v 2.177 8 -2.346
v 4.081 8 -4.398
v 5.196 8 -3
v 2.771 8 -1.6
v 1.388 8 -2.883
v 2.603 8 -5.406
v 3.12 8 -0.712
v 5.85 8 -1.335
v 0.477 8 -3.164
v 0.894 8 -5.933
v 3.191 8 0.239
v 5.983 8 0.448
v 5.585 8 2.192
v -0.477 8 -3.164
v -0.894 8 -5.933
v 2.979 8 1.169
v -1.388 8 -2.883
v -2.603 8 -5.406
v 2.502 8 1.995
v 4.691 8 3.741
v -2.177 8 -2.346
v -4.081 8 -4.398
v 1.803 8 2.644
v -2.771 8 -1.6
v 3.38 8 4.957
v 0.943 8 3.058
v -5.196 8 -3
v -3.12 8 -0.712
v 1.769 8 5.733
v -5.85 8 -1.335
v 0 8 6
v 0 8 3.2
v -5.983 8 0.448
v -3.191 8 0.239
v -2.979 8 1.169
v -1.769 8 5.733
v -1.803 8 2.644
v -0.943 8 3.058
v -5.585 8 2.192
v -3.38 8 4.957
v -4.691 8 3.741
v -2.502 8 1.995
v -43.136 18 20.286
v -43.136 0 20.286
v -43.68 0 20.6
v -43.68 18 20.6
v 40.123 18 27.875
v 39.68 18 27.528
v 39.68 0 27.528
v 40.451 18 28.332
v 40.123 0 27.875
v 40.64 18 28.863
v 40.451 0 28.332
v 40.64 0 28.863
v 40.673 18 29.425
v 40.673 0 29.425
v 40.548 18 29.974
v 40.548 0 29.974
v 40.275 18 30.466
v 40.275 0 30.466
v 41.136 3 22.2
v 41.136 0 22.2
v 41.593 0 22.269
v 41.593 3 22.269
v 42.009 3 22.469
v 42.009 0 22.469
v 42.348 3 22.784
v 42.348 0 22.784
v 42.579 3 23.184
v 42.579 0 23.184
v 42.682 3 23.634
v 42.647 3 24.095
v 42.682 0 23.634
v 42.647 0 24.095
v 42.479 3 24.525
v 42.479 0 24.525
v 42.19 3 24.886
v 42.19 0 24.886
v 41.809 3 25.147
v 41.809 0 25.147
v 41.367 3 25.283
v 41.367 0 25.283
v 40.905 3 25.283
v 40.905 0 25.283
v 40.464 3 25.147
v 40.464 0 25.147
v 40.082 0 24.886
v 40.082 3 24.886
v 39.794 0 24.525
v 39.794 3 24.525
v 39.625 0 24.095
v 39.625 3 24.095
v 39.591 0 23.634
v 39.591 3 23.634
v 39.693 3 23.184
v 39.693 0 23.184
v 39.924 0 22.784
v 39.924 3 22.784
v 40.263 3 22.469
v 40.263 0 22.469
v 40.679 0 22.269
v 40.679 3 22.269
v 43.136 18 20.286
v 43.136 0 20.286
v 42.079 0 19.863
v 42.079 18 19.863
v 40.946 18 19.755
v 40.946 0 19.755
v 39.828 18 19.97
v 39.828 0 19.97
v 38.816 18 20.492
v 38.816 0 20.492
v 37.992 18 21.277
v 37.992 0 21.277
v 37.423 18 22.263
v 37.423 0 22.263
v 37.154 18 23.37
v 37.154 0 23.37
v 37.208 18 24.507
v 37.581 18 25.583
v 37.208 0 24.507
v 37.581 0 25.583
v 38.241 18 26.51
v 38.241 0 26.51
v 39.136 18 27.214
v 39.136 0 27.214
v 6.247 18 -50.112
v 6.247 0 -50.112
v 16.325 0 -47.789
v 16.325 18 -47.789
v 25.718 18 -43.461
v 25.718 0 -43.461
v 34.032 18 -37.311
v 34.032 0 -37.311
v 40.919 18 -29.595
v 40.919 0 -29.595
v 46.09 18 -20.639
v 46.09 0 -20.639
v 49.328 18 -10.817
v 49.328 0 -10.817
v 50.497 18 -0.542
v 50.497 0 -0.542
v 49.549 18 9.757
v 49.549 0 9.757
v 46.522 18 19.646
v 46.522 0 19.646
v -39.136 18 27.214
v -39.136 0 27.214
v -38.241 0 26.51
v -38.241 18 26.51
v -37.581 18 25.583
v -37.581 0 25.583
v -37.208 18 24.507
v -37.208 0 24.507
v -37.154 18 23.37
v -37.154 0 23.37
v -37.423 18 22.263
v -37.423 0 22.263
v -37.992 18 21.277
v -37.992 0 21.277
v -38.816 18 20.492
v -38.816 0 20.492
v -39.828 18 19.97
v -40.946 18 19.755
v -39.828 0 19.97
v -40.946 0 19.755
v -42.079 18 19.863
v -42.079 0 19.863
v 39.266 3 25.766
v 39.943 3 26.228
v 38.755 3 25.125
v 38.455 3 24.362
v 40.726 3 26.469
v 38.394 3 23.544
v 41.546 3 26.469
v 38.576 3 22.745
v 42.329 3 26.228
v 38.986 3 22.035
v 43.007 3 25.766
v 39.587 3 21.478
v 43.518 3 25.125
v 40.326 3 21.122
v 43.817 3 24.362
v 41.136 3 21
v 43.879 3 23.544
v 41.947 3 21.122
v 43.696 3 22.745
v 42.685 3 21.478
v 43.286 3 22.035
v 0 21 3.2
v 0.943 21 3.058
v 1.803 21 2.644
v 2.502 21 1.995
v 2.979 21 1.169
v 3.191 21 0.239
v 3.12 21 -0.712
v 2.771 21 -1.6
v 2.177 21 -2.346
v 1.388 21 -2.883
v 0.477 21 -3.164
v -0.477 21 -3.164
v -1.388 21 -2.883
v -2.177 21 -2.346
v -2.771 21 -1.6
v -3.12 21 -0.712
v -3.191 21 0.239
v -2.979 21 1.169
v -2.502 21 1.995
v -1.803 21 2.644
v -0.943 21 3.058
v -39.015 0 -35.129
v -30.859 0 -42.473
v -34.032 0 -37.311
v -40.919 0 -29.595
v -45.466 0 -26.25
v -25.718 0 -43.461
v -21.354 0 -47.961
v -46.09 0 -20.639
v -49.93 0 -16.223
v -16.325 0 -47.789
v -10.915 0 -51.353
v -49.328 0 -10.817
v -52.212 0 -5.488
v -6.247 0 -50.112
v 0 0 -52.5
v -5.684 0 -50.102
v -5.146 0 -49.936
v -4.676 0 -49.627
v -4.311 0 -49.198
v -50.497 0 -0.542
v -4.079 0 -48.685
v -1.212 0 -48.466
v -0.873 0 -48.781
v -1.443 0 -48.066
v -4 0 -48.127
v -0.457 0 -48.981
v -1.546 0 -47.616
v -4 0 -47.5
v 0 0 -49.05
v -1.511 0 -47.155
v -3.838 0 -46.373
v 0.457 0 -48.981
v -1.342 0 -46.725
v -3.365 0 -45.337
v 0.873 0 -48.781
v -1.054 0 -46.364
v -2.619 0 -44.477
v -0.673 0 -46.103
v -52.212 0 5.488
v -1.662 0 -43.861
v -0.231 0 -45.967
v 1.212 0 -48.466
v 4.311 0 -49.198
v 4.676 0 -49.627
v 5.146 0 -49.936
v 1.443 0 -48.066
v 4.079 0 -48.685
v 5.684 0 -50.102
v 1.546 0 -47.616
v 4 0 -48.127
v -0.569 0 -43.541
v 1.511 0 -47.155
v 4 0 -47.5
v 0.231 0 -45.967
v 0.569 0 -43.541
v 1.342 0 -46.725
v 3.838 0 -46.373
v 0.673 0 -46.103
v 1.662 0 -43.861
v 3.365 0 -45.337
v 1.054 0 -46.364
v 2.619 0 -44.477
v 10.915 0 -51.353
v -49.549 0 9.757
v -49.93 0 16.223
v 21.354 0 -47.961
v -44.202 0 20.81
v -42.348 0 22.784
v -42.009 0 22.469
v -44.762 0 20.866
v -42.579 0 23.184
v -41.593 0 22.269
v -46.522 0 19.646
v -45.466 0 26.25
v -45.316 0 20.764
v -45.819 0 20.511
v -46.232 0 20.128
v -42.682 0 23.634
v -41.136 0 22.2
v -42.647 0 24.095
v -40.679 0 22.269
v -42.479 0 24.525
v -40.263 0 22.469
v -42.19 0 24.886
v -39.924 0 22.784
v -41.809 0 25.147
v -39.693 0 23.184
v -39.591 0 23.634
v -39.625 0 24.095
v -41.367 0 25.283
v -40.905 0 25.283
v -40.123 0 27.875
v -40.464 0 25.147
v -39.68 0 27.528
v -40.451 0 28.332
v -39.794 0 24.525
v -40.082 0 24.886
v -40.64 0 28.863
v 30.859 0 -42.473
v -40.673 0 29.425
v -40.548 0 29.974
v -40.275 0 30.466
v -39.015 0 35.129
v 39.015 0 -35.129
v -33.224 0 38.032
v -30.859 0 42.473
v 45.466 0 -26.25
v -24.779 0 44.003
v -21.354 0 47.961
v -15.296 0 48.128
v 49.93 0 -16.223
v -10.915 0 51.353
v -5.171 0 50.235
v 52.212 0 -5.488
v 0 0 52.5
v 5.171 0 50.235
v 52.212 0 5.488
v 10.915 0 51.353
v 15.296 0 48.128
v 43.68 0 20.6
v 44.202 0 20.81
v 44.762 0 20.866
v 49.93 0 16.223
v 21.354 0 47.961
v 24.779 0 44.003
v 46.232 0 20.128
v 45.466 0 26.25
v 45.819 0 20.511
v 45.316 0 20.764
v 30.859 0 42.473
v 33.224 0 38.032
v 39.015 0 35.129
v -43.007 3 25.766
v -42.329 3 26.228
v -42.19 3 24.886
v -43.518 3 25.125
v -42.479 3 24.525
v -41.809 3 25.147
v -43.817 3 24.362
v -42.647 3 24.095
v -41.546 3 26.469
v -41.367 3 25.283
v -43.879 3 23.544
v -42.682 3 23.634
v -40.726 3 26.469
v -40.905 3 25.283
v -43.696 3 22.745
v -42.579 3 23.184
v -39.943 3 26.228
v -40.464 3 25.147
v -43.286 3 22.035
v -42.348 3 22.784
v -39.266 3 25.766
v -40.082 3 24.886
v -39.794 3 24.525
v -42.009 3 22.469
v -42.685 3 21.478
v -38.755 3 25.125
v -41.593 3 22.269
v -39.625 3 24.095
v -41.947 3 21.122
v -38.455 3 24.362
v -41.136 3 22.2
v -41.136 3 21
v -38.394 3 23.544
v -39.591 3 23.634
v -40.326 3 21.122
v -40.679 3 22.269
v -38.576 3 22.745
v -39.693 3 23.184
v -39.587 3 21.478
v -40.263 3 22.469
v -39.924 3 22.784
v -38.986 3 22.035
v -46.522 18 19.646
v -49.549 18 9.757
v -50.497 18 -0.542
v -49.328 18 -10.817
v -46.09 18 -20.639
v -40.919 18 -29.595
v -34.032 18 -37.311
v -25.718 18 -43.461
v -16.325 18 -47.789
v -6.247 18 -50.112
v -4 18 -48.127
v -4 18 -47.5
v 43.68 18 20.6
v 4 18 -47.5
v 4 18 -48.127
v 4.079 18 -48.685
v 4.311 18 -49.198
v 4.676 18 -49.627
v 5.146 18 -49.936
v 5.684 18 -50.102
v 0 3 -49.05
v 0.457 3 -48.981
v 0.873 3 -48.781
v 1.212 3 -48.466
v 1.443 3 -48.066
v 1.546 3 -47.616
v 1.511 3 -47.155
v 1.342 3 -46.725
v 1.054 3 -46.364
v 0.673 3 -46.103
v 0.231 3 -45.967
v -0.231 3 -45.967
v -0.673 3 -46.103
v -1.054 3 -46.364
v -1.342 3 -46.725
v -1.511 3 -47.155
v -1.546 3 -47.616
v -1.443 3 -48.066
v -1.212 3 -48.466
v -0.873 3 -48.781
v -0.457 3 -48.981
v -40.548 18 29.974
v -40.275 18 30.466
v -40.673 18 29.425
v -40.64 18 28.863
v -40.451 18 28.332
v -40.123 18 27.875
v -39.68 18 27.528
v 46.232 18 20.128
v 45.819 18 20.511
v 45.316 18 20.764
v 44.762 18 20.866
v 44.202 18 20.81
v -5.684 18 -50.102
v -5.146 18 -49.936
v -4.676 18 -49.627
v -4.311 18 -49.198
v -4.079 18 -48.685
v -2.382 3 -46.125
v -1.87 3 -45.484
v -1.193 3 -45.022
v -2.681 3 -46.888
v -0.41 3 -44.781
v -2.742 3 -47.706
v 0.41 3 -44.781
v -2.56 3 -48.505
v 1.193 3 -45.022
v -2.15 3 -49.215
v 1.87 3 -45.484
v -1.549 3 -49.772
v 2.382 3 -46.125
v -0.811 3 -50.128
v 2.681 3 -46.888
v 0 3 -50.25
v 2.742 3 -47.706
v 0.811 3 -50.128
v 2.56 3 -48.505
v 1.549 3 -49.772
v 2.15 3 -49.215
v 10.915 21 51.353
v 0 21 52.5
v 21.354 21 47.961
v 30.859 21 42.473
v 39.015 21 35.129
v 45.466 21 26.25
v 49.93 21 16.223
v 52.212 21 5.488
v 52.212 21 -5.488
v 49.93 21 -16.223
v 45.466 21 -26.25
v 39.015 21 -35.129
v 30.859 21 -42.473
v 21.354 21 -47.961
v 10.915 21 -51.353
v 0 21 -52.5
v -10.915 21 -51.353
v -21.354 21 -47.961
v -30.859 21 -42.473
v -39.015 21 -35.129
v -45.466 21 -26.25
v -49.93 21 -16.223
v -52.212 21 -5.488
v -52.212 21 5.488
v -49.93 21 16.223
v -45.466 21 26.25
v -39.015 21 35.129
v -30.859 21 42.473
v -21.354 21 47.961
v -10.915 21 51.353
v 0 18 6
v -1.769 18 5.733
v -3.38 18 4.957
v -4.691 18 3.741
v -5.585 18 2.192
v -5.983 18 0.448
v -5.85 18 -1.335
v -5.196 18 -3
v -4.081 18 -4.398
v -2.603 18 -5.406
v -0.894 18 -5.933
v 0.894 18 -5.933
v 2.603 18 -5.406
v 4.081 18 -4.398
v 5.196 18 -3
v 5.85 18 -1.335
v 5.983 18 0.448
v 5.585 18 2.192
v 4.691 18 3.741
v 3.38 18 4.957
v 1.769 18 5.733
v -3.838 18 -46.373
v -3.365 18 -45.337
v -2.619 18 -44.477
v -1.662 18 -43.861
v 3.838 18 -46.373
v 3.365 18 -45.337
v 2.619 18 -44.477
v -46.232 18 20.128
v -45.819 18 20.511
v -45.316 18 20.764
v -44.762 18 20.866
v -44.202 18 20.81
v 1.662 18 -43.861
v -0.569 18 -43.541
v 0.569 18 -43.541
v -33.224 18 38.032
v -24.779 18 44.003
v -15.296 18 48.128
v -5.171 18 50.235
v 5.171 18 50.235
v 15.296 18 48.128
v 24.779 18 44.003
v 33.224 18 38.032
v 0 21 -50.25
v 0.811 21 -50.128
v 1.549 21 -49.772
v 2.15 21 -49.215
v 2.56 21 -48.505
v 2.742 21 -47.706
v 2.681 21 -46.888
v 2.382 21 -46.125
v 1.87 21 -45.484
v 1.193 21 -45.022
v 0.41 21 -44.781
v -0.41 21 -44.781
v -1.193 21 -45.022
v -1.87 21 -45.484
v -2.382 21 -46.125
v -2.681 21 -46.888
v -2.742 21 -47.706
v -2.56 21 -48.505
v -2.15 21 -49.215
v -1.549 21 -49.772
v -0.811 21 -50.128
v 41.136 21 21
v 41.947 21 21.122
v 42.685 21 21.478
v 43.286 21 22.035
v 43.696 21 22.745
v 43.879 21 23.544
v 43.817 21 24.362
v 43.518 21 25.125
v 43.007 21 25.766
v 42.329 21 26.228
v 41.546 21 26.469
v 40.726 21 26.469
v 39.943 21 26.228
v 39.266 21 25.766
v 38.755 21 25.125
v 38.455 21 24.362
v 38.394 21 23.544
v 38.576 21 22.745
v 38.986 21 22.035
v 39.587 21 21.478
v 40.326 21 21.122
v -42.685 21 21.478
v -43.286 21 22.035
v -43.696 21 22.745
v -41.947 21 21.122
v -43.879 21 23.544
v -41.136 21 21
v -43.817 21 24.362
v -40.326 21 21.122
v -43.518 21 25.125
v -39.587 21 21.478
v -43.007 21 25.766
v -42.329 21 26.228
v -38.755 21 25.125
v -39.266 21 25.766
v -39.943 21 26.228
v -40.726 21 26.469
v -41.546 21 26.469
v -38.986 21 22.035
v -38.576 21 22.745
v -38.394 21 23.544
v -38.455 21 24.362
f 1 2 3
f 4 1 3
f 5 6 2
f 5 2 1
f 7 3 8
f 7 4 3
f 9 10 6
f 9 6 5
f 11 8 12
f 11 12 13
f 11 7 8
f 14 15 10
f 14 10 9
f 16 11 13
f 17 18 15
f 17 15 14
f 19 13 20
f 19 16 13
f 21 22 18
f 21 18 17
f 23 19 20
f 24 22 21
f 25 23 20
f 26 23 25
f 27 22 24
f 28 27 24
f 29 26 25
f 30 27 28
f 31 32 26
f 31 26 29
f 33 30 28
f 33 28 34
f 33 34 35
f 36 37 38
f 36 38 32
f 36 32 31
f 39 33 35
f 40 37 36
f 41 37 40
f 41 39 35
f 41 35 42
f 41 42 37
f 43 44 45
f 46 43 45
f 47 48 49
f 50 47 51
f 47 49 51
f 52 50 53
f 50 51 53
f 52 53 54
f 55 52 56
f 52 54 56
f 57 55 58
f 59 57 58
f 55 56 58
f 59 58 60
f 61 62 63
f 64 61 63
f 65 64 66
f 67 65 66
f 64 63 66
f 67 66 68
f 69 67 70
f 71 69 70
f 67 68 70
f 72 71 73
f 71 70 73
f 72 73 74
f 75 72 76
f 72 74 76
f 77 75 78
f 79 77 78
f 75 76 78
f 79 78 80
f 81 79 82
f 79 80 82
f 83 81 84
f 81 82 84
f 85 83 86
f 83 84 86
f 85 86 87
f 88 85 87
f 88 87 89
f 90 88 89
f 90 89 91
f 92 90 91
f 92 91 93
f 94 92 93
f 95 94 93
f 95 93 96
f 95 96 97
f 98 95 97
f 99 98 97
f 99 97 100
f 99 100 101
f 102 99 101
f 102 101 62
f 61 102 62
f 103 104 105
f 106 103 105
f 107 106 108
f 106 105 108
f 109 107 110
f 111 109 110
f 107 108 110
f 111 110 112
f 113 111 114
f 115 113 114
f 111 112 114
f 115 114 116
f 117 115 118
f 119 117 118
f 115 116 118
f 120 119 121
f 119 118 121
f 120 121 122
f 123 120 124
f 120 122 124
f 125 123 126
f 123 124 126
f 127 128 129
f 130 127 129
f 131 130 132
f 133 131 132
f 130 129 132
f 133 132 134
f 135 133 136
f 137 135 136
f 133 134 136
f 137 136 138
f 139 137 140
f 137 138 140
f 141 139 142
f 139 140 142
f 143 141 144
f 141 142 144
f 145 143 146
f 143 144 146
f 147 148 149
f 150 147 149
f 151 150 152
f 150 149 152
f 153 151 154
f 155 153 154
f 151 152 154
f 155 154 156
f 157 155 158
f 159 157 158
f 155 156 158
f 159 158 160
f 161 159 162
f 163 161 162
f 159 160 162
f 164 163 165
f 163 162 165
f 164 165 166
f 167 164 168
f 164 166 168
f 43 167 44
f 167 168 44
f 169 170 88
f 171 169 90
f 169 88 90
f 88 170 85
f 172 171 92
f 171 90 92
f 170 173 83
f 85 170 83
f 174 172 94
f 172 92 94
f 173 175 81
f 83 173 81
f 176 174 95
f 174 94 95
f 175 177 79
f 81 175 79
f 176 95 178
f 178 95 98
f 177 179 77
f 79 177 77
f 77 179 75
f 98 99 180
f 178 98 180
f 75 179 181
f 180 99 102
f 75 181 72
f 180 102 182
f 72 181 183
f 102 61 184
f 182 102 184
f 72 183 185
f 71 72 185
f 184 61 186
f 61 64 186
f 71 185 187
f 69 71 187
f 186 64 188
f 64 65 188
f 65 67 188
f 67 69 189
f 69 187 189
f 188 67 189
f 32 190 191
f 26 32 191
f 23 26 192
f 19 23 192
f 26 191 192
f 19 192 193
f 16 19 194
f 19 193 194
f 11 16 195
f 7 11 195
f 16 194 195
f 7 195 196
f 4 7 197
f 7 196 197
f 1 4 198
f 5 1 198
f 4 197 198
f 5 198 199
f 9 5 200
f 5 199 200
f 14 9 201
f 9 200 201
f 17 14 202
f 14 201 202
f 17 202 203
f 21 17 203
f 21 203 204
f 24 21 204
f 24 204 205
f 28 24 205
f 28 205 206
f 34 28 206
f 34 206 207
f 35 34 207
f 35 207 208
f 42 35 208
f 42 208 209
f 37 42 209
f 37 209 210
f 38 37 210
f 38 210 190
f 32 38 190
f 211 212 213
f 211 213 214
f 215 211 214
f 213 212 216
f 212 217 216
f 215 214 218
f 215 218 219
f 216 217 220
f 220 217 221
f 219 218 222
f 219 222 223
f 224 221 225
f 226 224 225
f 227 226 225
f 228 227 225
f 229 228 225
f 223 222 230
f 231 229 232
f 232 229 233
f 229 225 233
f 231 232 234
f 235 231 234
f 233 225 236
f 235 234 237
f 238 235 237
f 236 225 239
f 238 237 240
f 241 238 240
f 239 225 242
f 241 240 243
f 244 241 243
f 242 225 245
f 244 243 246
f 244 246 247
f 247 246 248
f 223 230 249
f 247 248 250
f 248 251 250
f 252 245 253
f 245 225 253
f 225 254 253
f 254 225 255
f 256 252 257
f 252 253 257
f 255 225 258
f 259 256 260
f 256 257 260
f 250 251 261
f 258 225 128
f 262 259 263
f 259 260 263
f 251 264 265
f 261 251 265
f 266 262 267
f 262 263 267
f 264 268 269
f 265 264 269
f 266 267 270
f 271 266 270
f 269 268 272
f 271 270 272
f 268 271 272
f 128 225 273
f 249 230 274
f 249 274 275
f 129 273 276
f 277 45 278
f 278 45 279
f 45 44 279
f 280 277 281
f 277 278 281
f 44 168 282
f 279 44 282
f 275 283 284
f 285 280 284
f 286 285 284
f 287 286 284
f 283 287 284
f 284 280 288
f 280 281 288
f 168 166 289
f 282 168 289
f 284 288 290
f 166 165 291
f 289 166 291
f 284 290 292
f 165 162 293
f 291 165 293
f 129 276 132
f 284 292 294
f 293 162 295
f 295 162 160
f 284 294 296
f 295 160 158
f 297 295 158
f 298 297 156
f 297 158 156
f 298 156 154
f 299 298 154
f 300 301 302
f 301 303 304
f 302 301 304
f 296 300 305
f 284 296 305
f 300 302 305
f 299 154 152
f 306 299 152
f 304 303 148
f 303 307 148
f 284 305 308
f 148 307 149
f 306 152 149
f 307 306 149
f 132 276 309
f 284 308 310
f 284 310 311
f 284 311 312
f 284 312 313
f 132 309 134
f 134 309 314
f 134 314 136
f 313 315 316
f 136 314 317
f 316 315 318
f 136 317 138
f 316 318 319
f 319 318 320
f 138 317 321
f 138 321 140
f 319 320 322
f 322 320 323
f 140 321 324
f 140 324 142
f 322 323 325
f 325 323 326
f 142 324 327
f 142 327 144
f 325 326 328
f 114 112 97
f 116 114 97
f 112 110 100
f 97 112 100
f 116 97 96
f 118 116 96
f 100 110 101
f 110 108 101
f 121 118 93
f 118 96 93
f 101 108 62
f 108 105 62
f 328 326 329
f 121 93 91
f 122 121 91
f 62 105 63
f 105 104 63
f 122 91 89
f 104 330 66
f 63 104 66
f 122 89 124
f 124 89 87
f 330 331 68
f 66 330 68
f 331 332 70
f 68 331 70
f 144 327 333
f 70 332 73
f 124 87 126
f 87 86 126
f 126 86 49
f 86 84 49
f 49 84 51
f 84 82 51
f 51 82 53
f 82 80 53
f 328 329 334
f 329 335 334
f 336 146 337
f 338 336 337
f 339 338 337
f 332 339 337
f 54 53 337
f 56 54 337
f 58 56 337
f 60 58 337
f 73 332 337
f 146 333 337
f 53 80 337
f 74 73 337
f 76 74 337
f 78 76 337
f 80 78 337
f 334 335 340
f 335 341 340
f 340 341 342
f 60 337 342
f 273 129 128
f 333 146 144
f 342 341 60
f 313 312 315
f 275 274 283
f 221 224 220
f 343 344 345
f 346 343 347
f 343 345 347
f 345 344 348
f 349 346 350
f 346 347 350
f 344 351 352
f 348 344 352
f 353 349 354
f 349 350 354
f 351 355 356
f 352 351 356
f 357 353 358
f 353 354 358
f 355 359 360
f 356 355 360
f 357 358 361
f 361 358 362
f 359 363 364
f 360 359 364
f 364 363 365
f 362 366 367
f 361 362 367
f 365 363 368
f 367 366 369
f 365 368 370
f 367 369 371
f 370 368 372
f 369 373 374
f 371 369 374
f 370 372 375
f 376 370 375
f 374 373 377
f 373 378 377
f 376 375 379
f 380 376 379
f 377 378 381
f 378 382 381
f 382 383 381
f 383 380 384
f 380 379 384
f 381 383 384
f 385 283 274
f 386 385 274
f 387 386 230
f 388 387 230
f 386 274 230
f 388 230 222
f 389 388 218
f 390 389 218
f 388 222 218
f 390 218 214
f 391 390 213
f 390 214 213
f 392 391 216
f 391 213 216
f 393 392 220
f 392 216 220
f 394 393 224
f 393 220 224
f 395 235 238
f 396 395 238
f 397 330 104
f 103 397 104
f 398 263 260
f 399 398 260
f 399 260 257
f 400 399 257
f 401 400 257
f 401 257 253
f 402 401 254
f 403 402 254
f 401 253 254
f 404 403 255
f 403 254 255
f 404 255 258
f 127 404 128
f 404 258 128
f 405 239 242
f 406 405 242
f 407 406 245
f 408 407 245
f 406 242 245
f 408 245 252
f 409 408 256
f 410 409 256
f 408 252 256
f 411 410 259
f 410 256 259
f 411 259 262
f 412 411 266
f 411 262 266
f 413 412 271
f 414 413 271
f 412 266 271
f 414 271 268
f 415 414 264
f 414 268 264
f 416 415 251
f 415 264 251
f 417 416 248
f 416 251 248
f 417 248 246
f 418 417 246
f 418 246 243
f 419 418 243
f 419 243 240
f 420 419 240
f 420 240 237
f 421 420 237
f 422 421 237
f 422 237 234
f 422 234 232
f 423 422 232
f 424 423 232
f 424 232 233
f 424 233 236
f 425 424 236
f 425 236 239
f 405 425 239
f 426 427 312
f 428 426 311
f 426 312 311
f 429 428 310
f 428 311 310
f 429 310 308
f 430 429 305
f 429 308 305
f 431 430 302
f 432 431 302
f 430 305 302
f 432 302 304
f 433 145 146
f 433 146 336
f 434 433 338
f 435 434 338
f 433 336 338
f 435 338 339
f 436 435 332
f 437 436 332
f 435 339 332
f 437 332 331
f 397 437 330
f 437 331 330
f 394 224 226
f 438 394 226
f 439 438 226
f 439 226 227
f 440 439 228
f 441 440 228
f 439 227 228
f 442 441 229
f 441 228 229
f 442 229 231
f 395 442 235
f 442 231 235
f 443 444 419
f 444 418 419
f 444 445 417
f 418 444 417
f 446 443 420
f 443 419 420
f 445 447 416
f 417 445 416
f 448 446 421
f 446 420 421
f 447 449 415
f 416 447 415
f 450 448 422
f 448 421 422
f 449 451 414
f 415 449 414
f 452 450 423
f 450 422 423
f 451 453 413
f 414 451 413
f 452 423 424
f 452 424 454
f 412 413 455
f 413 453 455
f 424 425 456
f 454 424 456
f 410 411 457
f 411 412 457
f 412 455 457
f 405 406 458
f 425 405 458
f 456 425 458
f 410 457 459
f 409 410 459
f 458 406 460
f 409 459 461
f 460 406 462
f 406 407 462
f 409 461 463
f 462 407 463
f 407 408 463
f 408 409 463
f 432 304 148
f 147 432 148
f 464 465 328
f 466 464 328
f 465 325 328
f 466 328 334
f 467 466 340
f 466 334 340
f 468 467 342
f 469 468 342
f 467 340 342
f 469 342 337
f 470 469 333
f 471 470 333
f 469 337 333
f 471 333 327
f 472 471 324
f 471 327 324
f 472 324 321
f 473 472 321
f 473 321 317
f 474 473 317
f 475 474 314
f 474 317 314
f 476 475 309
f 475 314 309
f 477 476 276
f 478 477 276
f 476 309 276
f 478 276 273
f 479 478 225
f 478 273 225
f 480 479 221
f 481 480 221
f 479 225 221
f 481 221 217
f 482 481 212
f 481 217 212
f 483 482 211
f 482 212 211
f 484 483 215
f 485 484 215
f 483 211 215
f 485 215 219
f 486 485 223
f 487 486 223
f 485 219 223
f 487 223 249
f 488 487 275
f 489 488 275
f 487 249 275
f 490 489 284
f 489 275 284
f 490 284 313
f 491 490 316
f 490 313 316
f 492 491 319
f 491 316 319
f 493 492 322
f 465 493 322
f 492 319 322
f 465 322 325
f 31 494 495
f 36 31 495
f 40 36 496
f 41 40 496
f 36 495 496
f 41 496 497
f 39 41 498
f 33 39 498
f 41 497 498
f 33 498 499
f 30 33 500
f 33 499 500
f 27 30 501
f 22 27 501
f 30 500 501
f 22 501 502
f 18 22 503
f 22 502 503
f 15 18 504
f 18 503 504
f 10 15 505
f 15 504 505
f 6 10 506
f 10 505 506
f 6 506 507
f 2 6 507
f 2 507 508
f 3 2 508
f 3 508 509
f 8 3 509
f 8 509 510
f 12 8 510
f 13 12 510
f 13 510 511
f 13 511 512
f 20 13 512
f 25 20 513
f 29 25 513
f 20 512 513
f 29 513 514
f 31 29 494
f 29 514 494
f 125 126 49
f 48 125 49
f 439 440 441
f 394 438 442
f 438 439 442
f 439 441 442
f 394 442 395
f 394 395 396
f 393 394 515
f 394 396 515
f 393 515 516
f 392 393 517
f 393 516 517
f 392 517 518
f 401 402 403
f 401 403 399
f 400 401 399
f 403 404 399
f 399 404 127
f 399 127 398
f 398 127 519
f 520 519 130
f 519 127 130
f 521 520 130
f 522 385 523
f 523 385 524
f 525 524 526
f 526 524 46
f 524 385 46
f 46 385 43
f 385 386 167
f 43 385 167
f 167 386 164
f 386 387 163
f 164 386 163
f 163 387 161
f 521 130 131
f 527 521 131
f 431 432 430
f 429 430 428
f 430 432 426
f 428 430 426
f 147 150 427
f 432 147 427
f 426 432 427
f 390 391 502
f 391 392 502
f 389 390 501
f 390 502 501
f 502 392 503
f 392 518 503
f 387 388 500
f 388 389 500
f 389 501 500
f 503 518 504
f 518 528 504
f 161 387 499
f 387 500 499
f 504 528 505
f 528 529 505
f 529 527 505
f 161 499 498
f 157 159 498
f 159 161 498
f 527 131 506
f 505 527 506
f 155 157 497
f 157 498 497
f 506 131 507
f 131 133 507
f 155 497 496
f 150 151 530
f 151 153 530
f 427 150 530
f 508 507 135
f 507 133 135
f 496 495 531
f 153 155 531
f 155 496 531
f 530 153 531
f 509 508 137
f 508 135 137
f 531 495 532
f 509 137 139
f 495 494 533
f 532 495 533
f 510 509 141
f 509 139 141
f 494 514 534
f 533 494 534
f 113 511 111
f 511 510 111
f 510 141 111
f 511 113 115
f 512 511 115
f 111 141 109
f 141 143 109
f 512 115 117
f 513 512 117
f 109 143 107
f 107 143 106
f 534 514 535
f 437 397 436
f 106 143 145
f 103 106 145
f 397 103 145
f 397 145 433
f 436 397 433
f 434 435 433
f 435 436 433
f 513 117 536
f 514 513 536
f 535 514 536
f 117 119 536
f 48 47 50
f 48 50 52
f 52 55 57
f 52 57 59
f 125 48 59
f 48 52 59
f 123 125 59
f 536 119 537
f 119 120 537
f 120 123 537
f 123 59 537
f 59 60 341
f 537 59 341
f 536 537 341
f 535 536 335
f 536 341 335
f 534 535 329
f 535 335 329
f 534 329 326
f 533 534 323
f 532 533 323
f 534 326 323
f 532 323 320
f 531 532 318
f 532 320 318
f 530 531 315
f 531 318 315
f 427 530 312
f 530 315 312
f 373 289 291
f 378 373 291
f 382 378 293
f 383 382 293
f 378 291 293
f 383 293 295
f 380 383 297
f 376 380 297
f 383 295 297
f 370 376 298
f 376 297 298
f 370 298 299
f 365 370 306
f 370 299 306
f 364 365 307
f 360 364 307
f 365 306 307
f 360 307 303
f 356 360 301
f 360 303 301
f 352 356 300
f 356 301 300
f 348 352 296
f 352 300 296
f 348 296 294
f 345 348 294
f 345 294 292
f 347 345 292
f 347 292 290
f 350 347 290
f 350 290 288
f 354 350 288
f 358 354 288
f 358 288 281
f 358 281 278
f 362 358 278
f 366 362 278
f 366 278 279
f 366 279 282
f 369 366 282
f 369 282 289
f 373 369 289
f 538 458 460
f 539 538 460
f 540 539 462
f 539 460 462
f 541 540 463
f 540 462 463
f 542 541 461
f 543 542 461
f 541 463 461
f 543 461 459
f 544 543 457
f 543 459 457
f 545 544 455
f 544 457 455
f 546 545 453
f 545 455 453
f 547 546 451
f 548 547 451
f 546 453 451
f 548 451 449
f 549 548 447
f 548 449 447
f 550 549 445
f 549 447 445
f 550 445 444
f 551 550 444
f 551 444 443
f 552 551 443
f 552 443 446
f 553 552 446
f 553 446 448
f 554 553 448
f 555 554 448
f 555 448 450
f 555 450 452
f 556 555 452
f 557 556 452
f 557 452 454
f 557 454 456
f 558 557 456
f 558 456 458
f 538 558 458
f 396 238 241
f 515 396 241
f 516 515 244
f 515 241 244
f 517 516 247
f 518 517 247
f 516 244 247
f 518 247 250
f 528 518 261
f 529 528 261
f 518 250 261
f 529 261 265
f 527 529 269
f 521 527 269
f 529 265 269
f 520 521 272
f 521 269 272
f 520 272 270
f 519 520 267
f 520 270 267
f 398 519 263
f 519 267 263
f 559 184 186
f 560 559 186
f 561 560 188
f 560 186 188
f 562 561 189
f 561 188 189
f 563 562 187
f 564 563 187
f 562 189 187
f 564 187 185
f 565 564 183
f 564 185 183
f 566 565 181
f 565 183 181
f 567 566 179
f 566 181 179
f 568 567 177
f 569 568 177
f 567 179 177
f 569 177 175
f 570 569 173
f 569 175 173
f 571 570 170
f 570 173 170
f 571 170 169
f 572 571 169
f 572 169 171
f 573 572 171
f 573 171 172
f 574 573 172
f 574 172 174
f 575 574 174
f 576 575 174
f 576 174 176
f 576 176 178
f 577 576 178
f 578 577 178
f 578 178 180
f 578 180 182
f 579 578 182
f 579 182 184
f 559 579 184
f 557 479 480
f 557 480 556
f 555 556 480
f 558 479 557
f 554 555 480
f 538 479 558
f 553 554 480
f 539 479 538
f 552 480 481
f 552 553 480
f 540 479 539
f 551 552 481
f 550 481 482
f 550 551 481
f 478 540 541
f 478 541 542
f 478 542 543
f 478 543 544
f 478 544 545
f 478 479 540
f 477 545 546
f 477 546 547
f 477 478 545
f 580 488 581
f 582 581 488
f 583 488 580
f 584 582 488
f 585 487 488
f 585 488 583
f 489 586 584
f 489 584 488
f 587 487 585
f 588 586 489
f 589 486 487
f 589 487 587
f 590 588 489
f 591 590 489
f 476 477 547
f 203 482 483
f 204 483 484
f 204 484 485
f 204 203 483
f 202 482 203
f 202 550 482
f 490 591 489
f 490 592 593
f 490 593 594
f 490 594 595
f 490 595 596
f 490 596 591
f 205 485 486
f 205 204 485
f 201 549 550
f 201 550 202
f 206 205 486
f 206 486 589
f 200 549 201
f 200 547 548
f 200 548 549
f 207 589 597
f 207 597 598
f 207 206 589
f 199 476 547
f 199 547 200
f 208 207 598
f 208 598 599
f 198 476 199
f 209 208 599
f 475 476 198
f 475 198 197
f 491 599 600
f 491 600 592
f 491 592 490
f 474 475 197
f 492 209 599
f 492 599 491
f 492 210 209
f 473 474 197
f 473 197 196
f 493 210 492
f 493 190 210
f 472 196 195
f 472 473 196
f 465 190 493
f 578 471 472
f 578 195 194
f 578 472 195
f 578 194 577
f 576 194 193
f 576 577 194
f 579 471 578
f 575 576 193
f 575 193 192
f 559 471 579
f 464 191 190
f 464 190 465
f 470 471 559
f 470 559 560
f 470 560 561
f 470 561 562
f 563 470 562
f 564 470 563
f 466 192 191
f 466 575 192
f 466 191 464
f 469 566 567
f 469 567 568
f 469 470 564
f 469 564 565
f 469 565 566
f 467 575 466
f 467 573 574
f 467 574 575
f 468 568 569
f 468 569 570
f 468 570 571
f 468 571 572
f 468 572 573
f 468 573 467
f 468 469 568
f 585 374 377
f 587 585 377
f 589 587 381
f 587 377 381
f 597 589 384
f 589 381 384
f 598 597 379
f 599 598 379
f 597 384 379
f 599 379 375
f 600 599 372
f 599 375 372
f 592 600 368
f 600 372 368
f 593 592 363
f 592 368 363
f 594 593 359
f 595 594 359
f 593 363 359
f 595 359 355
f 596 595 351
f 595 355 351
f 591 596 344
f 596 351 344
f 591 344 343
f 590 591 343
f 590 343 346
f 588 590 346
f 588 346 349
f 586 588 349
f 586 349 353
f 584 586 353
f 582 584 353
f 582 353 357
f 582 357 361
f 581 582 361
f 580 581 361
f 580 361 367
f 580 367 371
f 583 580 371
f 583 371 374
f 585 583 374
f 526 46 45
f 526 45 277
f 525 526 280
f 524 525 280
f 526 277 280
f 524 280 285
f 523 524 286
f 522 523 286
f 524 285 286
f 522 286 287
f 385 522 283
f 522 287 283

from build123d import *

# Parameters (mm, degrees)
ESQUISSE1_R             = 52.5
BOSS_EXTRU_1_DEPTH      = 18
ESQUISSE2_R             = 52.5
BOSS_EXTRU_2_DEPTH      = 3
ENL_V_START             = -3
ESQUISSE3_R             = 2.75
ENL_V_MAT_EXTRU_2_DEPTH = 75.158926898
ESQUISSE4_R             = 1.55
ENL_V_MAT_EXTRU_3_DEPTH = 78.158926898
ESQUISSE6_R             = 6
BOSS_EXTRU_3_DEPTH      = 10
ESQUISSE7_R             = 3.2
ENL_V_MAT_EXTRU_5_DEPTH = 78.158926898


with BuildPart() as part:
    # Esquisse1 → Boss.-Extru.1 (new body)
    with BuildSketch(Plane(origin=(0, 0, 0), x_dir=(1, 0, 0), z_dir=(0, 1, 0))):
        with Locations(Location((0, 0, 0), (0, 0, 270))):
            Circle(ESQUISSE1_R)
        with BuildLine():
            ThreePointArc((-4, 47.5), (0, 43.5), (4, 47.5))
            Line((4, 47.5), (4, 48.127435003))
            ThreePointArc((4, 48.127435003), (4.676150568, 49.626575651), (6.24742268, 50.112071498))
            ThreePointArc((6.24742268, 50.112071498), (43.734282891, 25.25), (46.522038294, -19.645609))
            ThreePointArc((46.522038294, -19.645609), (45.3159505, -20.763622642), (43.679581332, -20.599615887))
            Line((43.679581332, -20.599615887), (43.13620668, -20.285898385))
            ThreePointArc((43.13620668, -20.285898385), (37.672105065, -21.75), (39.13620668, -27.214101615))
            Line((39.13620668, -27.214101615), (39.679581332, -27.527819117))
            ThreePointArc((39.679581332, -27.527819117), (40.639799932, -28.862953009), (40.274615614, -30.466462499))
            ThreePointArc((40.274615614, -30.466462499), (0, -50.5), (-40.274615614, -30.466462499))
            ThreePointArc((-40.274615614, -30.466462499), (-40.639799932, -28.862953009), (-39.679581332, -27.527819117))
            Line((-39.679581332, -27.527819117), (-39.13620668, -27.214101615))
            ThreePointArc((-39.13620668, -27.214101615), (-37.672105065, -21.75), (-43.13620668, -20.285898385))
            Line((-43.13620668, -20.285898385), (-43.679581332, -20.599615887))
            ThreePointArc((-43.679581332, -20.599615887), (-45.3159505, -20.763622642), (-46.522038294, -19.645609))
            ThreePointArc((-46.522038294, -19.645609), (-43.734282891, 25.25), (-6.24742268, 50.112071498))
            ThreePointArc((-6.24742268, 50.112071498), (-4.676150568, 49.626575651), (-4, 48.127435003))
            Line((-4, 48.127435003), (-4, 47.5))
        make_face(mode=Mode.SUBTRACT)
    extrude(amount=BOSS_EXTRU_1_DEPTH)

    # Esquisse2 → Boss.-Extru.2 (add)
    with BuildSketch(Plane(origin=(0, 18, 0), x_dir=(1, 0, 0), z_dir=(0, 1, 0))):
        with Locations(Location((0, 0, 0), (0, 0, 270))):
            Circle(ESQUISSE2_R)
    extrude(amount=BOSS_EXTRU_2_DEPTH)

    # Esquisse3 → Enlèv. mat.-Extru.2 (cut, through all)
    with BuildSketch(Plane.XZ.offset(ENL_V_START)):
        with Locations(Location((0, -47.5, 0), (0, 0, 270))):
            Circle(ESQUISSE3_R)
        with Locations(Location((-41.13620668, 23.75, 0), (0, 0, 270))):
            Circle(ESQUISSE3_R)
        with Locations(Location((41.13620668, 23.75, 0), (0, 0, 270))):
            Circle(ESQUISSE3_R)
    extrude(amount=-ENL_V_MAT_EXTRU_2_DEPTH, mode=Mode.SUBTRACT)

    # Esquisse4 → Enlèv. mat.-Extru.3 (cut, through all)
    with BuildSketch(Plane.XZ):
        with Locations(Location((0, -47.5, 0), (0, 0, 270))):
            Circle(ESQUISSE4_R)
        with Locations(Location((-41.13620668, 23.75, 0), (0, 0, 270))):
            Circle(ESQUISSE4_R)
        with Locations(Location((41.13620668, 23.75, 0), (0, 0, 270))):
            Circle(ESQUISSE4_R)
    extrude(amount=-ENL_V_MAT_EXTRU_3_DEPTH, mode=Mode.SUBTRACT)

    # Esquisse6 → Boss.-Extru.3 (add)
    with BuildSketch(Plane.XZ.offset(-18)):
        with Locations(Location((0, 0, 0), (0, 0, 90))):
            Circle(ESQUISSE6_R)
    extrude(amount=BOSS_EXTRU_3_DEPTH)

    # Esquisse7 → Enlèv. mat.-Extru.5 (cut, through all)
    with BuildSketch(Plane(origin=(0, 21, 0), x_dir=(1, 0, 0), z_dir=(0, 1, 0))):
        with Locations(Location((0, 0, 0), (0, 0, 270))):
            Circle(ESQUISSE7_R)
    extrude(amount=-ENL_V_MAT_EXTRU_5_DEPTH, mode=Mode.SUBTRACT)


solid = part.part
